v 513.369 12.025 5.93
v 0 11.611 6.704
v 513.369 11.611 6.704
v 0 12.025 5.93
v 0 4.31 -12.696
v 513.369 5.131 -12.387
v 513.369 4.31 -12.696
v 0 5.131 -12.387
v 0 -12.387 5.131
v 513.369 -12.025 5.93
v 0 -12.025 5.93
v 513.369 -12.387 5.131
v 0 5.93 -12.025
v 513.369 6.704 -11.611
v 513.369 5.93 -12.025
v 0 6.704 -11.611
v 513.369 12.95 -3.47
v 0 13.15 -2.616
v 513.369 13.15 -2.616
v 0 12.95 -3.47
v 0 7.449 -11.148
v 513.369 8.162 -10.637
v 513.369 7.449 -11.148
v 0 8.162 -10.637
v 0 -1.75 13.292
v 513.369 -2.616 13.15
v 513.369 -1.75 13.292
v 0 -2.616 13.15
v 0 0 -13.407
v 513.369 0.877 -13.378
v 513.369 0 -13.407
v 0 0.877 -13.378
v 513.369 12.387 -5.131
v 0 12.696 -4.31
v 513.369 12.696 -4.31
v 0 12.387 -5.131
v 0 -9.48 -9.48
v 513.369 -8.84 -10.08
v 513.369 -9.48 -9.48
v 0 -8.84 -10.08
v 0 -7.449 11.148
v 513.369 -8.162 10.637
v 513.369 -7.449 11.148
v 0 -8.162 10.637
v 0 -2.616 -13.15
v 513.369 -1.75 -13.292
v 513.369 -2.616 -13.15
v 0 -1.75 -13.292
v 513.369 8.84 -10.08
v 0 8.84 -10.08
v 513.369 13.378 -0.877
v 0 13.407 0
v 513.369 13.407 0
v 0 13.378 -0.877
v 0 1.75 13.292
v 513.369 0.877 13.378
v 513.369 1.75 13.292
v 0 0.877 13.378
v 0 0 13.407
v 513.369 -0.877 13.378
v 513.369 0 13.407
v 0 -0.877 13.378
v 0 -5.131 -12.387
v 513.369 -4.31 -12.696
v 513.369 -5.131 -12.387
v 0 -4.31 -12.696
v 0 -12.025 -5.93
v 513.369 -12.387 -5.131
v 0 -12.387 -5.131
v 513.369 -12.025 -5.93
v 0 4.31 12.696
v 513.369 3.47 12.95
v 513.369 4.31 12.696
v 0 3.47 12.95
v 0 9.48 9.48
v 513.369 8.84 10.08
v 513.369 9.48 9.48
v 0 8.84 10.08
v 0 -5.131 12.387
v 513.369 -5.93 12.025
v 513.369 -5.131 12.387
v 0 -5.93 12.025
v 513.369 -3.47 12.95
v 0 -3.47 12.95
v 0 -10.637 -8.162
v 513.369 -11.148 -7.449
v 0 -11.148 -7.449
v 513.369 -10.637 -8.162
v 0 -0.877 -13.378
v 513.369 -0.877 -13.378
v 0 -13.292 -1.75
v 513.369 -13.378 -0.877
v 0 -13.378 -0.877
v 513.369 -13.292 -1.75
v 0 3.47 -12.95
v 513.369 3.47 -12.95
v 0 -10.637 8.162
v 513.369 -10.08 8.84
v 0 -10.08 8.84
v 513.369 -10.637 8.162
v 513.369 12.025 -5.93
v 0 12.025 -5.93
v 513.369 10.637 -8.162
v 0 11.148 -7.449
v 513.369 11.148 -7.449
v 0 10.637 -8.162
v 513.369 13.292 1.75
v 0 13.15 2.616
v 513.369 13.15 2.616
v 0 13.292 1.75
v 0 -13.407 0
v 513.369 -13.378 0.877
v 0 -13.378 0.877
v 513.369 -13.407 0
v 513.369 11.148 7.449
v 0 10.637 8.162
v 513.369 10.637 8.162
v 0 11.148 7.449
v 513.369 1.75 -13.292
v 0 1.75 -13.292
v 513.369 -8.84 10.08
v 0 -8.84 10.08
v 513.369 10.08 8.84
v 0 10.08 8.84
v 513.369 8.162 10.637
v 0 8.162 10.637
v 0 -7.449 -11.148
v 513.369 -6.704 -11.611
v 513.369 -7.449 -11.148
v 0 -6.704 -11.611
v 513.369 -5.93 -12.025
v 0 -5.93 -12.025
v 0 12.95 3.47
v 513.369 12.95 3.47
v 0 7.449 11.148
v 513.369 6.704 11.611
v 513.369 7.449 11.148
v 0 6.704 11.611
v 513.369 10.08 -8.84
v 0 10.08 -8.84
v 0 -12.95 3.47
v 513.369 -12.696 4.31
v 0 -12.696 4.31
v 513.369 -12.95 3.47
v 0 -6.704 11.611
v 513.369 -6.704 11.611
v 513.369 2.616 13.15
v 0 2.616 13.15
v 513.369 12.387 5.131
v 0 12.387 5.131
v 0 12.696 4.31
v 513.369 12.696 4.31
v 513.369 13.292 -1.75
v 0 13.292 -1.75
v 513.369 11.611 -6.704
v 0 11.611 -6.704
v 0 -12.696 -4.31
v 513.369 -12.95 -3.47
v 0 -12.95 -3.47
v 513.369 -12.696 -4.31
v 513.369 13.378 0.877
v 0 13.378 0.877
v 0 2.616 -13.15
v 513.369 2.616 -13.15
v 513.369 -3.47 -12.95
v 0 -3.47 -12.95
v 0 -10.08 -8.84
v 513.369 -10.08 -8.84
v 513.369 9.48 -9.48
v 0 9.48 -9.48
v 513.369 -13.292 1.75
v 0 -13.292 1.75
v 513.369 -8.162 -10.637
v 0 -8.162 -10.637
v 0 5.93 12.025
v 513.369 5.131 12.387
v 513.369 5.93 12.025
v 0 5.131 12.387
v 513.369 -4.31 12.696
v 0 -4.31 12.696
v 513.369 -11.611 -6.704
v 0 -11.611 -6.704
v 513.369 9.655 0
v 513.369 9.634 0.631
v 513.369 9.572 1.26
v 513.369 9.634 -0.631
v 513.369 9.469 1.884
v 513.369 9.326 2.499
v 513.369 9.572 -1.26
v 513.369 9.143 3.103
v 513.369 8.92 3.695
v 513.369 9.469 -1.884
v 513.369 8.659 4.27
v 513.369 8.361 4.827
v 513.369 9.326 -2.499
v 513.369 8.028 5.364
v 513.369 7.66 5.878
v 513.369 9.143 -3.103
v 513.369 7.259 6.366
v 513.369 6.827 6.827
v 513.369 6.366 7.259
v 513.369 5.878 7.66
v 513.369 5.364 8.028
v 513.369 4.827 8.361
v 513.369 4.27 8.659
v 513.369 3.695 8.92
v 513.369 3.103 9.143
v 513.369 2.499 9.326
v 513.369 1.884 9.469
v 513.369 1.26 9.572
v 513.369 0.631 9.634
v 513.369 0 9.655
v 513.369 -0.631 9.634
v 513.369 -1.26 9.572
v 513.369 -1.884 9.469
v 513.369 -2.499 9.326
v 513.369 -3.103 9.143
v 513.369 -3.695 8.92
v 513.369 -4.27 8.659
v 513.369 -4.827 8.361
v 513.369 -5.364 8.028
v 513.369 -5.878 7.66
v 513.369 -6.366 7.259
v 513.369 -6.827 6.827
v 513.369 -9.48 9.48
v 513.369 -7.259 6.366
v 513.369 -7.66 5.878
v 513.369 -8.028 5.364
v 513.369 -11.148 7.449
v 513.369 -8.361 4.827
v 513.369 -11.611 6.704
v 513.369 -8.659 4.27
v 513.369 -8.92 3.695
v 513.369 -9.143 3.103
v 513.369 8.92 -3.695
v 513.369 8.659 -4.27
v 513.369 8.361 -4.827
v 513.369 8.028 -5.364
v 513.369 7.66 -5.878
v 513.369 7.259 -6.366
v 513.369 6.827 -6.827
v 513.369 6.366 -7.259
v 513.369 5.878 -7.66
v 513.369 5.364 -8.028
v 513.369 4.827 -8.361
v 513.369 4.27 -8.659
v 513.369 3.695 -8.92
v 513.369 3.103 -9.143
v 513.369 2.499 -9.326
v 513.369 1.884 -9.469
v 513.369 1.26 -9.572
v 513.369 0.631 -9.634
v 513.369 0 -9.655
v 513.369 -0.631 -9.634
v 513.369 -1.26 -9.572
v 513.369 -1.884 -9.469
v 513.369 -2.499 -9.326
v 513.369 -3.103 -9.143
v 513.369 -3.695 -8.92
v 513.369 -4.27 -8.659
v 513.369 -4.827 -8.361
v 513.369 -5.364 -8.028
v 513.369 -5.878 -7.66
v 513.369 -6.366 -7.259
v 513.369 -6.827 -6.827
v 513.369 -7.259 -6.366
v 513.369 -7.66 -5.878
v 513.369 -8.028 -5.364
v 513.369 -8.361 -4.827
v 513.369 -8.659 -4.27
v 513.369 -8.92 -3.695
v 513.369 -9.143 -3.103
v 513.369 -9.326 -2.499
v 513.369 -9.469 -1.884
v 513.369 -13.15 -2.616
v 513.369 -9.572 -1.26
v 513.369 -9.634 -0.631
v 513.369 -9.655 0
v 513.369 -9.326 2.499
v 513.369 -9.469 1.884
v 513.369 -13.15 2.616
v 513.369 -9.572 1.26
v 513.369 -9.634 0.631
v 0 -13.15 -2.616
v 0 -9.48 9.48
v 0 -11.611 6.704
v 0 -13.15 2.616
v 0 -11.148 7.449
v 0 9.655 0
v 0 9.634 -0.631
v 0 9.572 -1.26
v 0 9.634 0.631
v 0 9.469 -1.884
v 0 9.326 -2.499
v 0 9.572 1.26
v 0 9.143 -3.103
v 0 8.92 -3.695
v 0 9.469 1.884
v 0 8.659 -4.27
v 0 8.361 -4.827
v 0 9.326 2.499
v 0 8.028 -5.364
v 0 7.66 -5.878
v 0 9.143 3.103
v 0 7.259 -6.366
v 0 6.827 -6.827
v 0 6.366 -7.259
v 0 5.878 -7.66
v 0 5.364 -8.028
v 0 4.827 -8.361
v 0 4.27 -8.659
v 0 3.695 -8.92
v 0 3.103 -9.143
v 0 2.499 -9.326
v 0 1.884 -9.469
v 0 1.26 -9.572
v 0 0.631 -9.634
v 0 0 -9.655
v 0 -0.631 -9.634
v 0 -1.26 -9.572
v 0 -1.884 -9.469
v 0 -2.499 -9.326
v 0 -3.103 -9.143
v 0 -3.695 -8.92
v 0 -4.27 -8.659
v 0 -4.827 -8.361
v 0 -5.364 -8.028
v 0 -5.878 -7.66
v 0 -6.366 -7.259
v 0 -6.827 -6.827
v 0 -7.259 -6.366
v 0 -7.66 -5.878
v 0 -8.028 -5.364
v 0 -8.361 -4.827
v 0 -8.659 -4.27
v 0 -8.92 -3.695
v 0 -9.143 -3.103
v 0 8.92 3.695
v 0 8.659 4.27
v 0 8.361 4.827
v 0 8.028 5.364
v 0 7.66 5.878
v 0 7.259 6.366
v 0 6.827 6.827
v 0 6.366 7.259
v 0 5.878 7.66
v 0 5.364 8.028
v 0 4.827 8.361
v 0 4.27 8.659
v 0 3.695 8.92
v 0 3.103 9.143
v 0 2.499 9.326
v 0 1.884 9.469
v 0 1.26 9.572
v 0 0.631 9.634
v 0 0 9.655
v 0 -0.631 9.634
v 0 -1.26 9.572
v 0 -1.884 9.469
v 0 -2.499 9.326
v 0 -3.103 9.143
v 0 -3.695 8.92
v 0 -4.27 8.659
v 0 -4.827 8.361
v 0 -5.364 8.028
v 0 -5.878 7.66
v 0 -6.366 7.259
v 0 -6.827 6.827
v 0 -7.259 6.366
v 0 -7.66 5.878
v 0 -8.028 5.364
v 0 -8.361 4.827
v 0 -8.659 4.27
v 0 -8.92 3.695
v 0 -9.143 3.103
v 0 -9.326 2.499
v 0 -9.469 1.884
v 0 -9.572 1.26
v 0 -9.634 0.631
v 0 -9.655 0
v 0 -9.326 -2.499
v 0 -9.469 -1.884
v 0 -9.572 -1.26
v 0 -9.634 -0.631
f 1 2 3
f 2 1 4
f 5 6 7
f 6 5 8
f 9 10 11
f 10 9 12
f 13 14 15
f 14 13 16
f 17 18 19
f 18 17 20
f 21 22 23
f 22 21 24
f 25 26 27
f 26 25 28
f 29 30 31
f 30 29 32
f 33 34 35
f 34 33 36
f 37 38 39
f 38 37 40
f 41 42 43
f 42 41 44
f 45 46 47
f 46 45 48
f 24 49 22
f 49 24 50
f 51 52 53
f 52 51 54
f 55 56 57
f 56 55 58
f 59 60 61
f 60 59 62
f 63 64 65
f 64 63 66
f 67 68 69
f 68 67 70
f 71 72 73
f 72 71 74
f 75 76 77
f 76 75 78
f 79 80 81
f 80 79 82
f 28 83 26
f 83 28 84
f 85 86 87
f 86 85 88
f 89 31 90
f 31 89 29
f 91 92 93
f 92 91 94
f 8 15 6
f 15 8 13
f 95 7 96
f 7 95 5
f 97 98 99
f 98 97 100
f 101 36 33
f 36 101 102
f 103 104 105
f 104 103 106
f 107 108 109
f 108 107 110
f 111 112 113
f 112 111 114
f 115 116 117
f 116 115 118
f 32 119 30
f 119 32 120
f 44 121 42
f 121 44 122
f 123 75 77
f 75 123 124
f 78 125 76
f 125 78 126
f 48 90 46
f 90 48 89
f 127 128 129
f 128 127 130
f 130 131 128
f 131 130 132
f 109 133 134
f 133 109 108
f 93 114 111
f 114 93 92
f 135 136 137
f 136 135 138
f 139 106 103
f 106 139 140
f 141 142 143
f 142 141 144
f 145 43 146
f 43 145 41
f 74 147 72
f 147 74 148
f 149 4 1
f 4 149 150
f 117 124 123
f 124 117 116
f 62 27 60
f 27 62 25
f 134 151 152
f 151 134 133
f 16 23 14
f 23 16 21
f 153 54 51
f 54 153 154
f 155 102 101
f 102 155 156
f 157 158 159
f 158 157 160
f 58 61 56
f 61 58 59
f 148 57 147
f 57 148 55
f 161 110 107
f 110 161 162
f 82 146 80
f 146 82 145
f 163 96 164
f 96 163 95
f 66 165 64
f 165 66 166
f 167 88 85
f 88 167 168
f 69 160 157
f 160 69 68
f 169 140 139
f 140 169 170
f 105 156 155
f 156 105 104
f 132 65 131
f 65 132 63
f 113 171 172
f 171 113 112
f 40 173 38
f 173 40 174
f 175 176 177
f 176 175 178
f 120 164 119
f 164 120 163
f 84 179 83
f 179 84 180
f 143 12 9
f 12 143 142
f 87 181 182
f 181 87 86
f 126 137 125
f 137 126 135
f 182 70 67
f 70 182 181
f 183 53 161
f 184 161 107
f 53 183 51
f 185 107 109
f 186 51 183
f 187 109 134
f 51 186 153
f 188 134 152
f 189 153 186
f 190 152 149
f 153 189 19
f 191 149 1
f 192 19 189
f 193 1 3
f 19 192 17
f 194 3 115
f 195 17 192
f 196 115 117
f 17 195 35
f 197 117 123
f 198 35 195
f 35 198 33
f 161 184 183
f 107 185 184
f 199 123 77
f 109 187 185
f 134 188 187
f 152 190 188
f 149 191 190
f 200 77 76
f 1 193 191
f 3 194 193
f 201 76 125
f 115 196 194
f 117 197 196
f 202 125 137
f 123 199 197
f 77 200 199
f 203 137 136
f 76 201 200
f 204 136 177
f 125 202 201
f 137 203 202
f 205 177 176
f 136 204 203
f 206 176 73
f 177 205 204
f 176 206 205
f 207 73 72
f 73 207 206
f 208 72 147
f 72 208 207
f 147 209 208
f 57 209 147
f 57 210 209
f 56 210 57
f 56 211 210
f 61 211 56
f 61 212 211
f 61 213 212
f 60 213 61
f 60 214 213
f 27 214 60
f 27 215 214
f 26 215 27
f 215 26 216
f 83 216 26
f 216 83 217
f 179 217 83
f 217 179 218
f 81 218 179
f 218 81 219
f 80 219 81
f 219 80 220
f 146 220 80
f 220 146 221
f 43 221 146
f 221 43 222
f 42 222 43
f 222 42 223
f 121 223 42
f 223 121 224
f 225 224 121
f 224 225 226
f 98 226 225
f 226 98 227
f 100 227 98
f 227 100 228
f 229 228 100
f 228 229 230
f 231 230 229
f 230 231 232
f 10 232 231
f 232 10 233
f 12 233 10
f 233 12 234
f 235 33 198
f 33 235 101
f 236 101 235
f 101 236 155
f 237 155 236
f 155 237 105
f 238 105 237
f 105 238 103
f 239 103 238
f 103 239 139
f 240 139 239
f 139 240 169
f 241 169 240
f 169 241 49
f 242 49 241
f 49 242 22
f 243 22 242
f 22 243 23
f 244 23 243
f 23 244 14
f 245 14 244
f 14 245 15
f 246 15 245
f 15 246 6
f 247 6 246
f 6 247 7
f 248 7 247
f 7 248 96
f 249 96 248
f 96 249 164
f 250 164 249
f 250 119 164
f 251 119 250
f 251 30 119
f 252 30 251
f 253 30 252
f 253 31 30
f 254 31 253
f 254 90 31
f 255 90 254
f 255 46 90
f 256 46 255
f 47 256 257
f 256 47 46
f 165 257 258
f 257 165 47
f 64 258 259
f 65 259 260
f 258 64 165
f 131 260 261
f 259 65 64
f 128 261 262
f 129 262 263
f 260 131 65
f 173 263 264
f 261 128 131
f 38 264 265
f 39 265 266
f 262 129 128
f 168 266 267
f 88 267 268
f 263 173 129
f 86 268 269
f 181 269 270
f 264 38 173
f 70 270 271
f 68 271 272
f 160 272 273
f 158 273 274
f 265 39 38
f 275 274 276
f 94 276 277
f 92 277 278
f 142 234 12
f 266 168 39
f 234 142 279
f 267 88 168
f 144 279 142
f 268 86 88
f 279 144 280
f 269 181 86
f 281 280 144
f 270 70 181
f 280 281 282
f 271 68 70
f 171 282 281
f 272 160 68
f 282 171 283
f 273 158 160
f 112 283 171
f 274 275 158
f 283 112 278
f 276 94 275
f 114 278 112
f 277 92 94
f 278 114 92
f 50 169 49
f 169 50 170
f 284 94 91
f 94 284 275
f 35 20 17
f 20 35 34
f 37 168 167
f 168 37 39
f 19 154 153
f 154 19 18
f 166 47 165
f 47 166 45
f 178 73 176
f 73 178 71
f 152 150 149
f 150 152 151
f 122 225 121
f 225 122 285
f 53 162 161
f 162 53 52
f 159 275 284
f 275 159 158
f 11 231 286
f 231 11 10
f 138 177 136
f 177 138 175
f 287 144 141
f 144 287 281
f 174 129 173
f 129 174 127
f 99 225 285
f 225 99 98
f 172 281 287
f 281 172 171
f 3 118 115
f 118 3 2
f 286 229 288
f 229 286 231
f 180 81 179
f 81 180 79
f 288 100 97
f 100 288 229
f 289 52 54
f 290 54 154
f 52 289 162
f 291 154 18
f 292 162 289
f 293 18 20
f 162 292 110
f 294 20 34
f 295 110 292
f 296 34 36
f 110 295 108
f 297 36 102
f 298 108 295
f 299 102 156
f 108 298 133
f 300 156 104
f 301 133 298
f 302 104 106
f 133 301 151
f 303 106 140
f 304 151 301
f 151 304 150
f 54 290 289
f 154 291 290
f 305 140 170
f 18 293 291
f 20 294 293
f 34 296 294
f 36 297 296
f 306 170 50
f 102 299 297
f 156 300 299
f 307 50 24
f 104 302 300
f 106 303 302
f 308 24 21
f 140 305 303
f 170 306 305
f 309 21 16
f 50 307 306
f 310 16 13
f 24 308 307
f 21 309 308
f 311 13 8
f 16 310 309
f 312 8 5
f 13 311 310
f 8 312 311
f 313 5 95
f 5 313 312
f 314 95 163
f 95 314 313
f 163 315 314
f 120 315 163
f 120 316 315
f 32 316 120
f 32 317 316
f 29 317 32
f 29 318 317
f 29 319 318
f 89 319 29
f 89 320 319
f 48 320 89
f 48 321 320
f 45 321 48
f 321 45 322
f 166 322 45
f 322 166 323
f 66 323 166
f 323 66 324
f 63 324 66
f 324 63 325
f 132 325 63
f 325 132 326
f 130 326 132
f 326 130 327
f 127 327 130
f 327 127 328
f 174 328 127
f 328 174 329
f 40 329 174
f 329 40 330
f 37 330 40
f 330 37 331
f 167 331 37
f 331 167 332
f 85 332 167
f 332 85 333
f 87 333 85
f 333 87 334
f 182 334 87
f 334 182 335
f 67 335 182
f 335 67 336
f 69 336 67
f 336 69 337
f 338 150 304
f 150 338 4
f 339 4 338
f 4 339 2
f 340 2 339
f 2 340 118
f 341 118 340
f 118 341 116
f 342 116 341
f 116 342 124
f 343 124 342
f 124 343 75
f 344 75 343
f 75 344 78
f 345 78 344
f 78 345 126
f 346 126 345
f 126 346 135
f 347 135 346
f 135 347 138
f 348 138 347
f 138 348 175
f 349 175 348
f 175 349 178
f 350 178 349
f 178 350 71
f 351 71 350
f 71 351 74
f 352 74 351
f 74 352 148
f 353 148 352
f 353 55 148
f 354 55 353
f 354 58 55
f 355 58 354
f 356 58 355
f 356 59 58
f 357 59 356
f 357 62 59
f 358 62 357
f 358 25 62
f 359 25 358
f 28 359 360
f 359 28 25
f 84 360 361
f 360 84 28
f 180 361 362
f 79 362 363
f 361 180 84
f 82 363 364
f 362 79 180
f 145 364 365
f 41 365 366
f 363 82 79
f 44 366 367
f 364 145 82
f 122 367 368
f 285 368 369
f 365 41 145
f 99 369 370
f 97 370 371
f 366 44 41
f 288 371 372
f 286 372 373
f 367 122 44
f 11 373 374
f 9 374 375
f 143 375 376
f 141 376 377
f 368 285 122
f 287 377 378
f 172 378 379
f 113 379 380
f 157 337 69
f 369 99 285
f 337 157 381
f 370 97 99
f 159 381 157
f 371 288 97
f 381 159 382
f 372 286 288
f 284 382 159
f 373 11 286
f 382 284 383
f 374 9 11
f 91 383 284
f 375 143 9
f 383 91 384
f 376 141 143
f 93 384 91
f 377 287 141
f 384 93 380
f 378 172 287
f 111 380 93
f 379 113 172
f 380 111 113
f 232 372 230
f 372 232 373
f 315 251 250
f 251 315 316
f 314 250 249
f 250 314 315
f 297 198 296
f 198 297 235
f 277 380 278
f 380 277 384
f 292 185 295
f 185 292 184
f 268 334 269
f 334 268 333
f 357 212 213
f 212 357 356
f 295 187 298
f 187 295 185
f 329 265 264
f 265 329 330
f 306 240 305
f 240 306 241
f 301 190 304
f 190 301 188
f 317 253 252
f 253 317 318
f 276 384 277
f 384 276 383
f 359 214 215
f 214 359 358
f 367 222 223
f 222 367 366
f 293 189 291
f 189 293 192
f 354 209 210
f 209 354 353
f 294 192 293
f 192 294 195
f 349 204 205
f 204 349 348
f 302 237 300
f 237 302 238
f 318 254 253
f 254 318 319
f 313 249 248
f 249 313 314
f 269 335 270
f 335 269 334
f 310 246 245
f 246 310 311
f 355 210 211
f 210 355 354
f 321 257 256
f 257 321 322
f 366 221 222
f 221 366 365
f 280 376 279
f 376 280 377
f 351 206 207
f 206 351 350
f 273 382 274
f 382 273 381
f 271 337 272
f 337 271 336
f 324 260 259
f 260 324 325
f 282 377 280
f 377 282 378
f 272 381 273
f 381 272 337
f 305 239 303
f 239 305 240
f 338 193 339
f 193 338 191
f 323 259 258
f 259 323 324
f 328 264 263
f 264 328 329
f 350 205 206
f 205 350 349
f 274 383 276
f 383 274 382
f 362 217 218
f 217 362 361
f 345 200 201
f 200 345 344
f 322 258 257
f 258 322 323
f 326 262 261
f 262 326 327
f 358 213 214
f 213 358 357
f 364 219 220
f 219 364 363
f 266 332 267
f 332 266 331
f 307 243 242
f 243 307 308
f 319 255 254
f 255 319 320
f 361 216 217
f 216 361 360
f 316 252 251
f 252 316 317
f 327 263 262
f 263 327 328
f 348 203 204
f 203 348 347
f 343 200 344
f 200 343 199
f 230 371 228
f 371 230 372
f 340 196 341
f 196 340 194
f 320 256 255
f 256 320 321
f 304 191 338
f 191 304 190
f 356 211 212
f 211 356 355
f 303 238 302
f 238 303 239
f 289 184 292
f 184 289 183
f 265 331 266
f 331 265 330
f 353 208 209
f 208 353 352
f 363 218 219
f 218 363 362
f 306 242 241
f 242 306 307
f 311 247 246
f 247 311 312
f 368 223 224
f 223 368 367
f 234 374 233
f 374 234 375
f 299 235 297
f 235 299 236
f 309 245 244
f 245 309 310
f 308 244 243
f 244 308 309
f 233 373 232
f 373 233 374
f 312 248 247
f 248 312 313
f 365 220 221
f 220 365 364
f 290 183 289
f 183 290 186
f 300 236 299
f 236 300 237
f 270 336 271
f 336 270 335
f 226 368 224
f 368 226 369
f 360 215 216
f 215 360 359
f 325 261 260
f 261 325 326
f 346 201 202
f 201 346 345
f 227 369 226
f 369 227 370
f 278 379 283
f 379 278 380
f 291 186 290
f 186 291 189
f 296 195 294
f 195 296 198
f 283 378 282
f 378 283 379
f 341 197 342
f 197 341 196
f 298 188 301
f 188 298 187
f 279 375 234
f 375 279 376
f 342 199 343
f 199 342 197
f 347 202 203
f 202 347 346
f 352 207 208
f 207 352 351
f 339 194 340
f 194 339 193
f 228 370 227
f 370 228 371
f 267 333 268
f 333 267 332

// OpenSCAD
// Slip-cast transverse flute body concept model.
// Units: inches. Convert to mm in slicer/CAD if needed.
// This is a geometry starter, not a final mold with draft analysis.

instrument_id = "SCF-G4-01";
fired_length = 17.786;
fired_bore = 0.669;
fired_wall = 0.130;
shrink_x = 0.12;
shrink_y = 0.12;
shrink_z = 0.12;

master_length = fired_length / (1 - shrink_x);
master_bore_y = fired_bore / (1 - shrink_y);
master_bore_z = fired_bore / (1 - shrink_z);
master_od_y = (fired_bore + 2*fired_wall) / (1 - shrink_y);
master_od_z = (fired_bore + 2*fired_wall) / (1 - shrink_z);

inch = 25.4;

module flute_outer() {
  scale([1, master_od_y/master_od_z, 1])
    rotate([0,90,0])
      cylinder(h=master_length*inch, d=master_od_z*inch, $fn=96);
}

module flute_bore() {
  scale([1, master_bore_y/master_bore_z, 1])
    translate([-0.01*inch,0,0])
      rotate([0,90,0])
        cylinder(h=(master_length+0.02)*inch, d=master_bore_z*inch, $fn=96);
}

difference() {
  flute_outer();
  flute_bore();
}
